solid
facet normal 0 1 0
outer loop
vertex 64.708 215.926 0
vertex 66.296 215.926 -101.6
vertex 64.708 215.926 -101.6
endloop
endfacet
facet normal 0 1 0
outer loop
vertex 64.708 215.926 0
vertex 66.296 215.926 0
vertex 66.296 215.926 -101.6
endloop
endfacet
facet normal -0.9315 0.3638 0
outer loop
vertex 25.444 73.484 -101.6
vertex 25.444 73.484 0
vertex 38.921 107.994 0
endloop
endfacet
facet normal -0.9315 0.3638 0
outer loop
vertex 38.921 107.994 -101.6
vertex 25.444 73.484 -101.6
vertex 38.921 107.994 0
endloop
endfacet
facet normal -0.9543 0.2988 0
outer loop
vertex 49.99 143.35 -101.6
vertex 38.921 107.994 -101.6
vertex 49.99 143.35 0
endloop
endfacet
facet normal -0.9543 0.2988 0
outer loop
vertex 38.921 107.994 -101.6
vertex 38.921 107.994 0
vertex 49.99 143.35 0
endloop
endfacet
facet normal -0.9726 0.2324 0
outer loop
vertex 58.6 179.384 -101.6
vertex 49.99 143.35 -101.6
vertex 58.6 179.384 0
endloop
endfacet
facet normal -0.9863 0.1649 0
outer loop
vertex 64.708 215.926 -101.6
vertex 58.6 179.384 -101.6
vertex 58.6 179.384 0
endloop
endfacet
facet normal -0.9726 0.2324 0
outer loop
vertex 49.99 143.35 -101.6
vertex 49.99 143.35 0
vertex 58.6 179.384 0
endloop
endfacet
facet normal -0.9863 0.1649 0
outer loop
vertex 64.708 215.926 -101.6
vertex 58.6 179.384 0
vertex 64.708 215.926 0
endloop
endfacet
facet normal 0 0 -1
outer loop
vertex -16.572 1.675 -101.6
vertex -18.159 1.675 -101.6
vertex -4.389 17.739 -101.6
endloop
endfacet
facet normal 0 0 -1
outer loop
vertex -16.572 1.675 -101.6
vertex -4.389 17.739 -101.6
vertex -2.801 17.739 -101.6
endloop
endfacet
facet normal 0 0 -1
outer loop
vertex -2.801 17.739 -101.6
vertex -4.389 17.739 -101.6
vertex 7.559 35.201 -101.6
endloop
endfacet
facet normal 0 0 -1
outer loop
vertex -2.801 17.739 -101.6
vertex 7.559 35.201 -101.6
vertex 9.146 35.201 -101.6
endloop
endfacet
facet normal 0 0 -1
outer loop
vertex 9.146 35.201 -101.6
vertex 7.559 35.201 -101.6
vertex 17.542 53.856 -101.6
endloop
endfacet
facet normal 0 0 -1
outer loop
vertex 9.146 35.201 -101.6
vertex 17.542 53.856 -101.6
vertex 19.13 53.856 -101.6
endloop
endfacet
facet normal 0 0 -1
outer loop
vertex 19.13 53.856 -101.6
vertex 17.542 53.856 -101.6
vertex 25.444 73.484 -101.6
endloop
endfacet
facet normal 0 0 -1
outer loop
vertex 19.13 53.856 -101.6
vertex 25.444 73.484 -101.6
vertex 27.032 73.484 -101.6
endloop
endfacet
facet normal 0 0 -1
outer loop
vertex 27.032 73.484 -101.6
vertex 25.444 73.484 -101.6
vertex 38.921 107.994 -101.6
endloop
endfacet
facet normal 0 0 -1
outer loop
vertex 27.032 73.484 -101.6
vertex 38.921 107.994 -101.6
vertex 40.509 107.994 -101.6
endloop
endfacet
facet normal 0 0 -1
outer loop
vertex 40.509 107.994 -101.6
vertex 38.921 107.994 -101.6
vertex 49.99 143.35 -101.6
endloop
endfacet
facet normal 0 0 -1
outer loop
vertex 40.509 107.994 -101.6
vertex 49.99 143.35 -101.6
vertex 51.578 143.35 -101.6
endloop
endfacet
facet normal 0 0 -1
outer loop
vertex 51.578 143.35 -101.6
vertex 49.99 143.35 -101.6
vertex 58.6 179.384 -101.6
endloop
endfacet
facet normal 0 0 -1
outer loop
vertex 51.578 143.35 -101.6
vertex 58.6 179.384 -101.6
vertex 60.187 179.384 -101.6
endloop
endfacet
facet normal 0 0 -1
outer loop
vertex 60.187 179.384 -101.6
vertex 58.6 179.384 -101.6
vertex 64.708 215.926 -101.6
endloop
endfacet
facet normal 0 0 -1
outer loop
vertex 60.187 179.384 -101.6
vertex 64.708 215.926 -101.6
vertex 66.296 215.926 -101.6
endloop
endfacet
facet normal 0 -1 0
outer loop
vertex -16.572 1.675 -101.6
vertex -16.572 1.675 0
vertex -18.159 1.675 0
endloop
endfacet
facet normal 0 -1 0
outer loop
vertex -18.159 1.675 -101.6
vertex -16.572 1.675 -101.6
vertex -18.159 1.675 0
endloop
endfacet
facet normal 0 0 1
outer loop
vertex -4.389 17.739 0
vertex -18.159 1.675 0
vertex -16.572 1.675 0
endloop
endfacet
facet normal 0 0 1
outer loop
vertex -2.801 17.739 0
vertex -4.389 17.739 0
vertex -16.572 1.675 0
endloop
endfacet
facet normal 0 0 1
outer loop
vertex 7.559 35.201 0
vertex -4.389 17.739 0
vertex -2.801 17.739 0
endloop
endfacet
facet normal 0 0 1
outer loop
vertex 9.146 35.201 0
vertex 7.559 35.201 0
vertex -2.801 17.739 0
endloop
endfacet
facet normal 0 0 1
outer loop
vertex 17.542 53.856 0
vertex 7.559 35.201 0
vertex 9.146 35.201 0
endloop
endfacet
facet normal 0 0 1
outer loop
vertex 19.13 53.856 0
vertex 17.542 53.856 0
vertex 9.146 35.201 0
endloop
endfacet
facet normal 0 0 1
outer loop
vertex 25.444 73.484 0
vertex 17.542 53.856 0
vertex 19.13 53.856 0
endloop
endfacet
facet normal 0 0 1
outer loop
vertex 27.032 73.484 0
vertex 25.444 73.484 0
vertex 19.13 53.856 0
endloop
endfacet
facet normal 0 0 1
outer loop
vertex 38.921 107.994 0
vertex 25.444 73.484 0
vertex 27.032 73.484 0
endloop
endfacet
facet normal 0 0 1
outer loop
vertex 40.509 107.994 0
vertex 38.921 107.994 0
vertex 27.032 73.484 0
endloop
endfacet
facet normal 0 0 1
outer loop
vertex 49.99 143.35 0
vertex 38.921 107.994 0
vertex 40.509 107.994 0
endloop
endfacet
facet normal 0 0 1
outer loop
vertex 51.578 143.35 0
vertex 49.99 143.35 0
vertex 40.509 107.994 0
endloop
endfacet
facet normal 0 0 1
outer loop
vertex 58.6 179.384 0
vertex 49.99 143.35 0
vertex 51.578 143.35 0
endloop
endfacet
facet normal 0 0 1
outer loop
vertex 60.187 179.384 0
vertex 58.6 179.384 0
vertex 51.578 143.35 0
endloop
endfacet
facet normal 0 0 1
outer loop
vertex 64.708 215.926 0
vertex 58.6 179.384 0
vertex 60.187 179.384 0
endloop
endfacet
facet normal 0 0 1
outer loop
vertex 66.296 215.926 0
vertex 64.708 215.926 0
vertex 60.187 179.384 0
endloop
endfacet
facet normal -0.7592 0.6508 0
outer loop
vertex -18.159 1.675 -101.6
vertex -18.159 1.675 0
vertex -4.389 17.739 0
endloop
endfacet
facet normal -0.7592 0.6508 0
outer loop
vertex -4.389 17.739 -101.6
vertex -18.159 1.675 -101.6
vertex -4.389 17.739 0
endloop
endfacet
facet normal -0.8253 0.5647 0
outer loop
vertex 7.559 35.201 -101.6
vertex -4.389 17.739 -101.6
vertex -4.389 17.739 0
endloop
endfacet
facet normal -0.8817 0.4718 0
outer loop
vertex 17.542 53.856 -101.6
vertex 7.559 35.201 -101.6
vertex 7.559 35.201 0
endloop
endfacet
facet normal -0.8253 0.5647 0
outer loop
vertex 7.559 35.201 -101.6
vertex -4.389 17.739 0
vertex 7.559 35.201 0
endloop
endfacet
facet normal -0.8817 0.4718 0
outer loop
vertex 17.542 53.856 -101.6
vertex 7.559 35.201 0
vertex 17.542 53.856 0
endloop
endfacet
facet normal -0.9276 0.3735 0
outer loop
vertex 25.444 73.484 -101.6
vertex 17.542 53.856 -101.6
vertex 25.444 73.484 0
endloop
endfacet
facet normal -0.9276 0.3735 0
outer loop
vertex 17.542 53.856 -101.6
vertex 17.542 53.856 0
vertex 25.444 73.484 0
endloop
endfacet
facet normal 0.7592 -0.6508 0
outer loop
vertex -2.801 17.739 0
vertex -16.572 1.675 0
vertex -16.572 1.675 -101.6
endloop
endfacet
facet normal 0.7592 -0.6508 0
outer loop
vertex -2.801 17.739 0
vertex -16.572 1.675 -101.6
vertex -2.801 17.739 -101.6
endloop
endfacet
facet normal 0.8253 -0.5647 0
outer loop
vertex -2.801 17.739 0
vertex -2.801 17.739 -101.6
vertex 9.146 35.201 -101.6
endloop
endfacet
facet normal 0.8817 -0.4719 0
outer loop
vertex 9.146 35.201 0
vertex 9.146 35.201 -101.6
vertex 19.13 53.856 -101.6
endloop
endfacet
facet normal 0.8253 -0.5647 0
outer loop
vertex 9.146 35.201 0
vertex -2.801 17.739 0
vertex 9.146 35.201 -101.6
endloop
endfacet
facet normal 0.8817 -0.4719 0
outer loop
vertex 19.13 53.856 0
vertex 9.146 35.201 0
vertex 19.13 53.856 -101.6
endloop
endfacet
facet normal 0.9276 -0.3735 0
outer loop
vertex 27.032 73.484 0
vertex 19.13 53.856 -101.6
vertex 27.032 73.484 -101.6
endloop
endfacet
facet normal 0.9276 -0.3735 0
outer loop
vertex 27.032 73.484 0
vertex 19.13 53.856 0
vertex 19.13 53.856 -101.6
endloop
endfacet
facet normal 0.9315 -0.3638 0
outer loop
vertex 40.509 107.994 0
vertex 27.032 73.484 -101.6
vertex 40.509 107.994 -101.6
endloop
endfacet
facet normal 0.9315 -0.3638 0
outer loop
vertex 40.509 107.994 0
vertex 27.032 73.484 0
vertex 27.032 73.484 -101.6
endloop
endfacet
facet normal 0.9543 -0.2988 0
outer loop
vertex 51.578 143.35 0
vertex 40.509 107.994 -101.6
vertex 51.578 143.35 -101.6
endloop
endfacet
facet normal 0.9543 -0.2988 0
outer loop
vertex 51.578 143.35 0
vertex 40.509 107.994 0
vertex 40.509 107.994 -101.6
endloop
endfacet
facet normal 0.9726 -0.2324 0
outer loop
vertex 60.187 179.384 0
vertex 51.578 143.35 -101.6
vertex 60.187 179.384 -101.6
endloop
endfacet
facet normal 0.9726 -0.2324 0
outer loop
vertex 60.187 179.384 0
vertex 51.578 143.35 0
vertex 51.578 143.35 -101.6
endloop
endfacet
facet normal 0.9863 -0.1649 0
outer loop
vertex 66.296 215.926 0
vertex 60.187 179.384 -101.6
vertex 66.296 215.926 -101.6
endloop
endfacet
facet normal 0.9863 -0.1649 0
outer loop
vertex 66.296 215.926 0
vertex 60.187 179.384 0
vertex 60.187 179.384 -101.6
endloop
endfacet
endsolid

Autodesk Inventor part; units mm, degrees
ref_plane "YZ Plane" through (0, 0, 0) normal (1, 0, 0) x (0, 1, 0)
ref_plane "XZ Plane" through (0, 0, 0) normal (0, 1, 0) x (-1, 0, 0)
ref_plane "XY Plane" through (0, 0, 0) normal (0, 0, 1) x (1, 0, 0)
sketch "Sketch1" plane through (0, 0, 0) normal (0, 0, 1) x (1, 0, 0)
  arc A0 (-16.5719, 1.6749) -> (27.0317, 73.4838) centre (-157.4047, 136.334) ccw
  arc A1 (27.0317, 73.4838) -> (66.2957, 215.9257) centre (-466.9704, 286.2877) ccw
  line L0 (-16.5719, 1.6749) -> (-18.1594, 1.6749)
  line L1 (66.2957, 215.9257) -> (64.7082, 215.9257)
  arc A2 (25.4442, 73.4838) -> (64.7082, 215.9257) centre (-468.558, 286.2877) ccw
  arc A3 (-18.1594, 1.6749) -> (25.4442, 73.4838) centre (-158.9922, 136.334) ccw
  dimension "d0" = 1.5875
  dimension "d2" = 1.5875
  dimension "d3" = 537.8882
  dimension "d4" = 194.851
extrude "Extrusion1" add sketch "Sketch1" against normal blind 101.6
properties part number "Bottom Lexan Ramp" material "Polycarbonate, Clear"
